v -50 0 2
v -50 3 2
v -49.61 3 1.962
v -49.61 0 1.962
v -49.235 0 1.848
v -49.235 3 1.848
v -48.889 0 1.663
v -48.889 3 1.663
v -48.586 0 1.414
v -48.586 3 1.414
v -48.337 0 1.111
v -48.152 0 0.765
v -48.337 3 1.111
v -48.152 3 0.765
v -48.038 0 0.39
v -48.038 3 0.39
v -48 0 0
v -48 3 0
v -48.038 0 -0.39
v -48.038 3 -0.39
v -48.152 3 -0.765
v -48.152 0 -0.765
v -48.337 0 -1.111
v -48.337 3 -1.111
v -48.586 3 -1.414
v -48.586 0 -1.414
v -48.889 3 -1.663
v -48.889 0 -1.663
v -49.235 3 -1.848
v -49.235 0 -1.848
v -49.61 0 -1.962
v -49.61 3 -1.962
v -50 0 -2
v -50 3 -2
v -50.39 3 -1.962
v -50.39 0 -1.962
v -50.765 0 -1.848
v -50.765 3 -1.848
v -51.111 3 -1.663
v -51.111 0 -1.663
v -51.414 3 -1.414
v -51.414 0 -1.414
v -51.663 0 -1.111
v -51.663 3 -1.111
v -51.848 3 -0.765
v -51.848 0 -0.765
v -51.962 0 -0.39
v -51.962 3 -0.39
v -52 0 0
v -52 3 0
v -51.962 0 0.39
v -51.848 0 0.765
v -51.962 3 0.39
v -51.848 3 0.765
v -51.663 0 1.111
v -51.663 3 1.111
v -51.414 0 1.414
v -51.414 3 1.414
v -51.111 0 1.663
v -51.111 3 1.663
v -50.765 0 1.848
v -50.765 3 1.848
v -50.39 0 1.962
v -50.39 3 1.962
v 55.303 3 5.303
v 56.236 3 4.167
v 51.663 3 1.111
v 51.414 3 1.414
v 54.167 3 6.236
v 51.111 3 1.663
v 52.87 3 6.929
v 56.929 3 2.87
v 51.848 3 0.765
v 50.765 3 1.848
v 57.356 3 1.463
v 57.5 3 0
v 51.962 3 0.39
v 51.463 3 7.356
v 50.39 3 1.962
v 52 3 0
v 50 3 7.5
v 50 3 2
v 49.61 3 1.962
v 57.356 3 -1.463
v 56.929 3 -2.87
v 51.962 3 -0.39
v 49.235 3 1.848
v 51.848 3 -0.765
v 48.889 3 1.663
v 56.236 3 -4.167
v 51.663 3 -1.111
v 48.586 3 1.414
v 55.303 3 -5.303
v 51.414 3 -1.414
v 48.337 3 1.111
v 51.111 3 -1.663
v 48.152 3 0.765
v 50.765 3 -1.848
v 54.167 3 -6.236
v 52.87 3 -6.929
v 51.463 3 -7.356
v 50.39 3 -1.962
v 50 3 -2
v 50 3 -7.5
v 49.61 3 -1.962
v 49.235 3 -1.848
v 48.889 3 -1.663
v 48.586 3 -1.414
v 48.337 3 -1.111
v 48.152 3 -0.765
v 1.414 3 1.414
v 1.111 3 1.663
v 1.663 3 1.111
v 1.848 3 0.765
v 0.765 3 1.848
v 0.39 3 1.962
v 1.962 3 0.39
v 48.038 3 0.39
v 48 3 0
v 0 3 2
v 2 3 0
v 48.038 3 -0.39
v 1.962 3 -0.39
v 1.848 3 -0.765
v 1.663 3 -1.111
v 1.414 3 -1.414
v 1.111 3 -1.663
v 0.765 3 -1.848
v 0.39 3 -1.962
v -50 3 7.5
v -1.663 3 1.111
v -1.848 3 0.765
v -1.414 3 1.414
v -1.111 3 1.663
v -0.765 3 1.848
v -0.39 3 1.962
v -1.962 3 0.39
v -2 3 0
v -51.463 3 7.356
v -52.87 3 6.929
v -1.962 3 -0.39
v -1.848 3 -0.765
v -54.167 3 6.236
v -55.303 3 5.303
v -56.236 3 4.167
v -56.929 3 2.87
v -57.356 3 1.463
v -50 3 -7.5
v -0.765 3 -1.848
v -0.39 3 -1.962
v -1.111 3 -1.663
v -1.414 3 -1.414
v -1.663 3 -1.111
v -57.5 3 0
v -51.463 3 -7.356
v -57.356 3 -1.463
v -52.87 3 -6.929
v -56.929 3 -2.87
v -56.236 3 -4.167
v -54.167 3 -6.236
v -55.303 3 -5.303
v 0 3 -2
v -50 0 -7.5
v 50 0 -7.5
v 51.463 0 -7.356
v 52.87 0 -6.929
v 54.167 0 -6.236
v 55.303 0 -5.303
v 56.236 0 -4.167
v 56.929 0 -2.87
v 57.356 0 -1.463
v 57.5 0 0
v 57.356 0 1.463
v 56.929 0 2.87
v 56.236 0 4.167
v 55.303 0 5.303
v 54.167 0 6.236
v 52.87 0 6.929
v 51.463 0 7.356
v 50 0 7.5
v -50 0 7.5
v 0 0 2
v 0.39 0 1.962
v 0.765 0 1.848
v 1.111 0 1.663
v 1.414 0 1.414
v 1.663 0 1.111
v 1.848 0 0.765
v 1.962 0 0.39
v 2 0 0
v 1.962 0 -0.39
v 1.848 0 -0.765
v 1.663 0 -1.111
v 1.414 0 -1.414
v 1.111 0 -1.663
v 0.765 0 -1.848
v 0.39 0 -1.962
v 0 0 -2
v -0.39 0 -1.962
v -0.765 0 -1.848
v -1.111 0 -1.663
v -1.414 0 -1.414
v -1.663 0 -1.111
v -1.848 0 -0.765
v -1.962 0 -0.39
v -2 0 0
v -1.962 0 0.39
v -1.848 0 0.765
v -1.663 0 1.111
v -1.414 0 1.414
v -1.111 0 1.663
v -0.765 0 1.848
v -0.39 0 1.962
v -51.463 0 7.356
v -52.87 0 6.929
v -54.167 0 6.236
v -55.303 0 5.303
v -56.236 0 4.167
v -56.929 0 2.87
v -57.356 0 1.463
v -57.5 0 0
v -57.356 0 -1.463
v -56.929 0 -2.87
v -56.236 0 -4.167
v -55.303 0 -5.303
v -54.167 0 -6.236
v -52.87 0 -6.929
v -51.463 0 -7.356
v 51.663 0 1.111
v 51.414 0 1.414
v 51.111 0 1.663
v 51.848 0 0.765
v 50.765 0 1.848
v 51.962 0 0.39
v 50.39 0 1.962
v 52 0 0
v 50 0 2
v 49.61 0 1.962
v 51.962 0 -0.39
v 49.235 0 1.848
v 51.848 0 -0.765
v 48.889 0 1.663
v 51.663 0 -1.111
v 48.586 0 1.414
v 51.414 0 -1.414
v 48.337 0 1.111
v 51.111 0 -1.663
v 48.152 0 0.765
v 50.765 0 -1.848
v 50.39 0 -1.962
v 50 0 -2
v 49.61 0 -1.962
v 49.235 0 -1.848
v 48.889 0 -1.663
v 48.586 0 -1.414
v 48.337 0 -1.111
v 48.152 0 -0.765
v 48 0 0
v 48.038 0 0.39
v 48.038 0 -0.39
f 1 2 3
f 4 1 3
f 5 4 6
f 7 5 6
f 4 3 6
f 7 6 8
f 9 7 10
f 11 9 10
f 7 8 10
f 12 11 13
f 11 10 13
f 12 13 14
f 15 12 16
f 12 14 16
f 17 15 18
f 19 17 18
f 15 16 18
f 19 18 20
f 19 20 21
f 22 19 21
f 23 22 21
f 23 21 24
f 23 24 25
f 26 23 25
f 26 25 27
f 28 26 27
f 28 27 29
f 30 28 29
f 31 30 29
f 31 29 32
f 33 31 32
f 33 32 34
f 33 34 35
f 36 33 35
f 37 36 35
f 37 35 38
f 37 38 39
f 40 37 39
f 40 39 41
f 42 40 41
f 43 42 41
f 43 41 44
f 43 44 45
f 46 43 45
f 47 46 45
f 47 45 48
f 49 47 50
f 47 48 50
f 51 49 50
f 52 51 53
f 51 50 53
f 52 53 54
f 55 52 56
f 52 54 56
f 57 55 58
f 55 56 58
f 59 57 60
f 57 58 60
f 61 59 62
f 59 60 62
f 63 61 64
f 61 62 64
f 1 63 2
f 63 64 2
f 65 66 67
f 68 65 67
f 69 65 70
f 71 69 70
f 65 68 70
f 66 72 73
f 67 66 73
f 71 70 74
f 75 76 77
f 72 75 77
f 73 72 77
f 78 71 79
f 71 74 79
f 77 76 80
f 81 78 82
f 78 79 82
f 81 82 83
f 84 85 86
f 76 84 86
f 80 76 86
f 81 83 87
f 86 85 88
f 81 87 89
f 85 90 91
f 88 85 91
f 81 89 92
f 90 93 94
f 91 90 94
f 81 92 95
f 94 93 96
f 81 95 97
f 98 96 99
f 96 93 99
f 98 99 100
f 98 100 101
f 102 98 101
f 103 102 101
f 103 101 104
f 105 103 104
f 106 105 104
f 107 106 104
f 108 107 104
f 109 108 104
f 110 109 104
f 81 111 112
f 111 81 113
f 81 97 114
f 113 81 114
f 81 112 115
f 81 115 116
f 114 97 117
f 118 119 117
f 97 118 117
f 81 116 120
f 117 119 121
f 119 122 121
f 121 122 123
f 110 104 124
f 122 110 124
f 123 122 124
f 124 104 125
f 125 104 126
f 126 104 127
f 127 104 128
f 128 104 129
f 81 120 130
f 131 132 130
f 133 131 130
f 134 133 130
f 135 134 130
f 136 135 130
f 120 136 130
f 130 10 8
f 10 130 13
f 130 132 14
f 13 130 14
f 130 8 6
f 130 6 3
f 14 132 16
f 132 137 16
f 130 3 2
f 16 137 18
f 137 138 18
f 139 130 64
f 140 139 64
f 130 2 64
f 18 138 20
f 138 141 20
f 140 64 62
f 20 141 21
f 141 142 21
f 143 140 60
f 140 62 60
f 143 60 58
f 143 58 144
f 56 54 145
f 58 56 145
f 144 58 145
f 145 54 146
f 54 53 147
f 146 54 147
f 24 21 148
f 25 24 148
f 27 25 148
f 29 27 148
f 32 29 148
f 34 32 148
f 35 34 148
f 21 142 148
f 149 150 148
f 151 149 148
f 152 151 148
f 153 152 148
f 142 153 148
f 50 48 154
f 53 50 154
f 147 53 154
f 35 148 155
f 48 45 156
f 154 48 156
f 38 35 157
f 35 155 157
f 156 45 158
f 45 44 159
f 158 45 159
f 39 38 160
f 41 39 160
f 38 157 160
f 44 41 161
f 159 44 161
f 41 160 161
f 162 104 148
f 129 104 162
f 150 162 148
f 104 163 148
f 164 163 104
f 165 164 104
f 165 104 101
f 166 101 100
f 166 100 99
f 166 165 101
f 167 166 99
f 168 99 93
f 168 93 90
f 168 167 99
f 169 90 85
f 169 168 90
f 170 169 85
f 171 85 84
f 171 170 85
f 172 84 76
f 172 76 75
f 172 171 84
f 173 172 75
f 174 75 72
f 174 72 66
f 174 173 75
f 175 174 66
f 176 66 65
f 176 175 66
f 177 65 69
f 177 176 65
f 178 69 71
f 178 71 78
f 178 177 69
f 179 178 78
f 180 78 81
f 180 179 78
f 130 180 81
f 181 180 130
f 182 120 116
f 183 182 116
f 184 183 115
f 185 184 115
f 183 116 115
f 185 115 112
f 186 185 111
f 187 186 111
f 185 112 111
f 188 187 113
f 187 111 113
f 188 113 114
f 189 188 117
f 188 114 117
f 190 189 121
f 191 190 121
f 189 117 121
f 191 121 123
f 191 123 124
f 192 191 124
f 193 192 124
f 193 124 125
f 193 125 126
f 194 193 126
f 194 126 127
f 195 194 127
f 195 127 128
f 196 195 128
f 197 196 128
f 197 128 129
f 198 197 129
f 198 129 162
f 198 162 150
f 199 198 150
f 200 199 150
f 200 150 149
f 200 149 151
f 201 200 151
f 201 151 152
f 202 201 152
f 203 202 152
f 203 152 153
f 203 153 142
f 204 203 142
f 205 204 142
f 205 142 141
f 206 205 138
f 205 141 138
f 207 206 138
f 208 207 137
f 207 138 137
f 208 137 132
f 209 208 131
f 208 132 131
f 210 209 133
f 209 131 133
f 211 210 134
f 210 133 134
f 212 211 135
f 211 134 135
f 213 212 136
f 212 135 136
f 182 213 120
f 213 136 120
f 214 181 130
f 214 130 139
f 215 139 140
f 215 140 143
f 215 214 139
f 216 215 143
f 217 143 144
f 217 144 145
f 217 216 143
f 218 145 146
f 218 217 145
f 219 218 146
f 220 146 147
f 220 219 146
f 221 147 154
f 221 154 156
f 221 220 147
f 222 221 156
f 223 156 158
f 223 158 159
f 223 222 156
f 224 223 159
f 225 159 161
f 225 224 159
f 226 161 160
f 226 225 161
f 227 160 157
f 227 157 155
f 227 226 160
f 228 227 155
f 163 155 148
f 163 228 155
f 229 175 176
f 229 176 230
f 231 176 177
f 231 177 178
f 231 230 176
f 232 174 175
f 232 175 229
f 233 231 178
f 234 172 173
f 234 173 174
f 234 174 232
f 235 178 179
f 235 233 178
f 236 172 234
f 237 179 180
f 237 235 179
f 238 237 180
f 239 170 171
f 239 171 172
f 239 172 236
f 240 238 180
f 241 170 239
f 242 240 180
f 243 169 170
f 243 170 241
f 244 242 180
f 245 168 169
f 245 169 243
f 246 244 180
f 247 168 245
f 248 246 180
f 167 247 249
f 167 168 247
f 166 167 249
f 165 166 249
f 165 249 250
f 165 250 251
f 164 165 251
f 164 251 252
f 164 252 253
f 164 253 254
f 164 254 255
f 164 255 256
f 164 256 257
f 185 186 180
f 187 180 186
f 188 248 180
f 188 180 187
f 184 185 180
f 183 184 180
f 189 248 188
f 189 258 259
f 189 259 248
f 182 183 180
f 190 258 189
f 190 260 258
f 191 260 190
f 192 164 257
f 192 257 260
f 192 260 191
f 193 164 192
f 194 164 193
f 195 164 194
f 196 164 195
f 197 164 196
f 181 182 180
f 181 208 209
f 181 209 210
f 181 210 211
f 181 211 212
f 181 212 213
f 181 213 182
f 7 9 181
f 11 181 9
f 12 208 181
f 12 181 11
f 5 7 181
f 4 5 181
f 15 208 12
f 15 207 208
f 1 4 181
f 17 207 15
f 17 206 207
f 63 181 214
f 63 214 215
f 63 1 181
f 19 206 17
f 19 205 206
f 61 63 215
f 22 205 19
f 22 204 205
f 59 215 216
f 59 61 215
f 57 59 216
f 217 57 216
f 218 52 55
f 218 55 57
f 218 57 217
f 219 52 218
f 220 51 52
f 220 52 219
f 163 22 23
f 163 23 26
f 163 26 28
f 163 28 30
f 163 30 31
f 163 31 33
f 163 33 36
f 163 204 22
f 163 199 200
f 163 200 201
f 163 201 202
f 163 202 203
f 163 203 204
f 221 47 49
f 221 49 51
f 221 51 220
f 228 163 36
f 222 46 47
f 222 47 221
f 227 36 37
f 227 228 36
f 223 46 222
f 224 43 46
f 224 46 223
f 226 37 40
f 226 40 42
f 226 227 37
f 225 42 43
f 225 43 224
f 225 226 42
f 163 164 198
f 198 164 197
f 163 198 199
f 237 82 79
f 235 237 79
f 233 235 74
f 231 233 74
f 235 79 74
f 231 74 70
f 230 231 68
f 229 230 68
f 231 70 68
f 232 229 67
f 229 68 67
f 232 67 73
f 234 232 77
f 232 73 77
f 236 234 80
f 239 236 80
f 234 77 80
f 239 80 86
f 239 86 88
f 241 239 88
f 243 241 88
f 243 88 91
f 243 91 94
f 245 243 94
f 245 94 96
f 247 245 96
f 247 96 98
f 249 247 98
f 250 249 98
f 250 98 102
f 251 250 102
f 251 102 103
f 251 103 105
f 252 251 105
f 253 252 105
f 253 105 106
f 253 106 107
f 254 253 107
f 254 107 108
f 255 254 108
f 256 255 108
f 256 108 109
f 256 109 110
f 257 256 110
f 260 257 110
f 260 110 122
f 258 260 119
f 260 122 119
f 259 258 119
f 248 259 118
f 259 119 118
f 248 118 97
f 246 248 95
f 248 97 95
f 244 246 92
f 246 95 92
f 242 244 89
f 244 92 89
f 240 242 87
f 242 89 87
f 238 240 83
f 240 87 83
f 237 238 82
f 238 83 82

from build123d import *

# Parameters (mm, degrees)
BOSS_EXTRUDE1_DEPTH = 3
SKETCH4_R           = 2
CUT_EXTRUDE1_DEPTH  = 10
SKETCH5_R           = 2
CUT_EXTRUDE2_DEPTH  = 10


with BuildPart() as part:
    # Sketch1 → Boss-Extrude1 (new body)
    with BuildSketch(Plane(origin=(0, 0, 0), x_dir=(1, 0, 0), z_dir=(0, 1, 0))):
        with BuildLine():
            Line((50, -7.5), (-50, -7.5))
            ThreePointArc((-50, -7.5), (-57.5, 0), (-50, 7.5))
            Line((-50, 7.5), (50, 7.5))
            ThreePointArc((50, 7.5), (57.5, 0), (50, -7.5))
        make_face()
    extrude(amount=BOSS_EXTRUDE1_DEPTH)

    # Sketch4 → Cut-Extrude1 (cut)
    with BuildSketch(Plane(origin=(0, 3, 0), x_dir=(1, 0, 0), z_dir=(0, 1, 0))):
        with Locations(Location((-50, 0, 0), (0, 0, 270))):
            Circle(SKETCH4_R)
        with Locations(Location((50, 0, 0), (0, 0, 270))):
            Circle(SKETCH4_R)
    extrude(amount=-CUT_EXTRUDE1_DEPTH, mode=Mode.SUBTRACT)

    # Sketch5 → Cut-Extrude2 (cut)
    with BuildSketch(Plane(origin=(0, 3, 0), x_dir=(1, 0, 0), z_dir=(0, 1, 0))):
        with Locations(Location((0, 0, 0), (0, 0, 270))):
            Circle(SKETCH5_R)
    extrude(amount=-CUT_EXTRUDE2_DEPTH, mode=Mode.SUBTRACT)


solid = part.part
